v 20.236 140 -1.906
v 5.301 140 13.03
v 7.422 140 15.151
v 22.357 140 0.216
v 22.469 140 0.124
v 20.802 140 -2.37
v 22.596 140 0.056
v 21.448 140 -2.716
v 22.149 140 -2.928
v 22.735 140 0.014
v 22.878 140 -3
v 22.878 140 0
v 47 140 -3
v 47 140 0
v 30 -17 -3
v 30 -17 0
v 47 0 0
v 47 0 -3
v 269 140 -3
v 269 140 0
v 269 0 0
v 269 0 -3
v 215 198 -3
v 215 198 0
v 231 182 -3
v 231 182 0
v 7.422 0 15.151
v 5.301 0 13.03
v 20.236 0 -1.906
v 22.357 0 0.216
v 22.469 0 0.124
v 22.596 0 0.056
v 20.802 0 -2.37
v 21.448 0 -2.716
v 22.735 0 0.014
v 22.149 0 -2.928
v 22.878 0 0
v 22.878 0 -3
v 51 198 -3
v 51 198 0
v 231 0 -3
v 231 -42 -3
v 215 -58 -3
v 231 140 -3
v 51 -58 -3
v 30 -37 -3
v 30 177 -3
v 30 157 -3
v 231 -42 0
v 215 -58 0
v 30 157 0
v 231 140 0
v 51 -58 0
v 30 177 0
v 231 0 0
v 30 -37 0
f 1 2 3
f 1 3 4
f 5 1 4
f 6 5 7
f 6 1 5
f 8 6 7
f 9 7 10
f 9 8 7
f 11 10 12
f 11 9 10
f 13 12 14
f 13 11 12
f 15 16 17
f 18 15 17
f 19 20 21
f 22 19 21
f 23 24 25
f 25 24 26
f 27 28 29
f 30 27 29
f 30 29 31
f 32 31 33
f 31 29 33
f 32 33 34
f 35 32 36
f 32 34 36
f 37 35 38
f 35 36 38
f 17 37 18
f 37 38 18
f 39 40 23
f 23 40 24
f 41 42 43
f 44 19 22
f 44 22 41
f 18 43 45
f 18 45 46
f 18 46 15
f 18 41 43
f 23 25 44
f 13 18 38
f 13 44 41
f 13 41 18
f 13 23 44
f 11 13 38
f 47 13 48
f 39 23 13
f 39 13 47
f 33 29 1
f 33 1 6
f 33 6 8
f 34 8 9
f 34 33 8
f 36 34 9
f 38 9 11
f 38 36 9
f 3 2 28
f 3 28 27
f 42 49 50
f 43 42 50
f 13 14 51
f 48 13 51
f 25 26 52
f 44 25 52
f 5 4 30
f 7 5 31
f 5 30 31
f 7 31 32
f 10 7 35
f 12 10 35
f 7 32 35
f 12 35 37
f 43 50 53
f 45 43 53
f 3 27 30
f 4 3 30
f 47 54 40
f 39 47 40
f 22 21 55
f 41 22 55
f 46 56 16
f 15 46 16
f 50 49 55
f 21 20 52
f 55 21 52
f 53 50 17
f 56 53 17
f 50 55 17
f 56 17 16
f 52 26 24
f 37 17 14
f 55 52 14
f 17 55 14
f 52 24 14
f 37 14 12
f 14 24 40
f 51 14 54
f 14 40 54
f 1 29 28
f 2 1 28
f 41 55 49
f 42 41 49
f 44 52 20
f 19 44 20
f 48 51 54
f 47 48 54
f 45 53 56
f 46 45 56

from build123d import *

# Parameters (mm, degrees)
BASE_FLANGE1_DEPTH     = 3
SKETCHED_BEND2_DEPTH   = 140
SKETCHED_BEND2_2_DEPTH = 140


# Read off the part's stored shape, not the designer's step: Sketched Bend2
# Sheet-metal steps are written as plain solids
with BuildPart() as part:
    # Sketch1 → Base-Flange1 (new body)
    with BuildSketch(Plane.XY):
        Polygon((0, 0), (0, 140), (47, 140), (30, 157), (30, 177), (51, 198), (215, 198), (231, 182), (231, 140), (269, 140), (269, 0), (231, 0), (231, -42), (215, -58), (51, -58), (30, -37), (30, -17), (47, 0), align=None)
    extrude(amount=-BASE_FLANGE1_DEPTH)

    # Sketched Bend2 outline → Sketched Bend2 (cut)
    with BuildSketch(Plane(origin=(0, 0, 0), x_dir=(1, 0, 0), z_dir=(0, 1, 0))):
        with BuildLine():
            Line((18.330560369, 0), (20.236135568, 1.905575199))
            ThreePointArc((20.236135568, 1.905575199), (21.448375853, 2.715568261), (22.878310766, 3))
            Line((22.878310766, 3), (0, 3))
            Line((0, 3), (0, 0))
            Line((0, 0), (18.330560369, 0))
        make_face()
    extrude(amount=SKETCHED_BEND2_DEPTH, mode=Mode.SUBTRACT)

    # Sketched Bend2 2 outline → Sketched Bend2 2 (add)
    with BuildSketch(Plane(origin=(0, 0, 0), x_dir=(1, 0, 0), z_dir=(0, 1, 0))):
        with BuildLine():
            Line((22.878310766, 0), (18.330560369, 0))
            Line((18.330560369, 0), (5.30084588, -13.029714489))
            Line((5.30084588, -13.029714489), (7.422166224, -15.151034832))
            Line((7.422166224, -15.151034832), (22.357455911, -0.215745145))
            ThreePointArc((22.357455911, -0.215745145), (22.59642615, -0.056070336), (22.878310766, 0))
        make_face()
    extrude(amount=SKETCHED_BEND2_2_DEPTH)


solid = part.part
